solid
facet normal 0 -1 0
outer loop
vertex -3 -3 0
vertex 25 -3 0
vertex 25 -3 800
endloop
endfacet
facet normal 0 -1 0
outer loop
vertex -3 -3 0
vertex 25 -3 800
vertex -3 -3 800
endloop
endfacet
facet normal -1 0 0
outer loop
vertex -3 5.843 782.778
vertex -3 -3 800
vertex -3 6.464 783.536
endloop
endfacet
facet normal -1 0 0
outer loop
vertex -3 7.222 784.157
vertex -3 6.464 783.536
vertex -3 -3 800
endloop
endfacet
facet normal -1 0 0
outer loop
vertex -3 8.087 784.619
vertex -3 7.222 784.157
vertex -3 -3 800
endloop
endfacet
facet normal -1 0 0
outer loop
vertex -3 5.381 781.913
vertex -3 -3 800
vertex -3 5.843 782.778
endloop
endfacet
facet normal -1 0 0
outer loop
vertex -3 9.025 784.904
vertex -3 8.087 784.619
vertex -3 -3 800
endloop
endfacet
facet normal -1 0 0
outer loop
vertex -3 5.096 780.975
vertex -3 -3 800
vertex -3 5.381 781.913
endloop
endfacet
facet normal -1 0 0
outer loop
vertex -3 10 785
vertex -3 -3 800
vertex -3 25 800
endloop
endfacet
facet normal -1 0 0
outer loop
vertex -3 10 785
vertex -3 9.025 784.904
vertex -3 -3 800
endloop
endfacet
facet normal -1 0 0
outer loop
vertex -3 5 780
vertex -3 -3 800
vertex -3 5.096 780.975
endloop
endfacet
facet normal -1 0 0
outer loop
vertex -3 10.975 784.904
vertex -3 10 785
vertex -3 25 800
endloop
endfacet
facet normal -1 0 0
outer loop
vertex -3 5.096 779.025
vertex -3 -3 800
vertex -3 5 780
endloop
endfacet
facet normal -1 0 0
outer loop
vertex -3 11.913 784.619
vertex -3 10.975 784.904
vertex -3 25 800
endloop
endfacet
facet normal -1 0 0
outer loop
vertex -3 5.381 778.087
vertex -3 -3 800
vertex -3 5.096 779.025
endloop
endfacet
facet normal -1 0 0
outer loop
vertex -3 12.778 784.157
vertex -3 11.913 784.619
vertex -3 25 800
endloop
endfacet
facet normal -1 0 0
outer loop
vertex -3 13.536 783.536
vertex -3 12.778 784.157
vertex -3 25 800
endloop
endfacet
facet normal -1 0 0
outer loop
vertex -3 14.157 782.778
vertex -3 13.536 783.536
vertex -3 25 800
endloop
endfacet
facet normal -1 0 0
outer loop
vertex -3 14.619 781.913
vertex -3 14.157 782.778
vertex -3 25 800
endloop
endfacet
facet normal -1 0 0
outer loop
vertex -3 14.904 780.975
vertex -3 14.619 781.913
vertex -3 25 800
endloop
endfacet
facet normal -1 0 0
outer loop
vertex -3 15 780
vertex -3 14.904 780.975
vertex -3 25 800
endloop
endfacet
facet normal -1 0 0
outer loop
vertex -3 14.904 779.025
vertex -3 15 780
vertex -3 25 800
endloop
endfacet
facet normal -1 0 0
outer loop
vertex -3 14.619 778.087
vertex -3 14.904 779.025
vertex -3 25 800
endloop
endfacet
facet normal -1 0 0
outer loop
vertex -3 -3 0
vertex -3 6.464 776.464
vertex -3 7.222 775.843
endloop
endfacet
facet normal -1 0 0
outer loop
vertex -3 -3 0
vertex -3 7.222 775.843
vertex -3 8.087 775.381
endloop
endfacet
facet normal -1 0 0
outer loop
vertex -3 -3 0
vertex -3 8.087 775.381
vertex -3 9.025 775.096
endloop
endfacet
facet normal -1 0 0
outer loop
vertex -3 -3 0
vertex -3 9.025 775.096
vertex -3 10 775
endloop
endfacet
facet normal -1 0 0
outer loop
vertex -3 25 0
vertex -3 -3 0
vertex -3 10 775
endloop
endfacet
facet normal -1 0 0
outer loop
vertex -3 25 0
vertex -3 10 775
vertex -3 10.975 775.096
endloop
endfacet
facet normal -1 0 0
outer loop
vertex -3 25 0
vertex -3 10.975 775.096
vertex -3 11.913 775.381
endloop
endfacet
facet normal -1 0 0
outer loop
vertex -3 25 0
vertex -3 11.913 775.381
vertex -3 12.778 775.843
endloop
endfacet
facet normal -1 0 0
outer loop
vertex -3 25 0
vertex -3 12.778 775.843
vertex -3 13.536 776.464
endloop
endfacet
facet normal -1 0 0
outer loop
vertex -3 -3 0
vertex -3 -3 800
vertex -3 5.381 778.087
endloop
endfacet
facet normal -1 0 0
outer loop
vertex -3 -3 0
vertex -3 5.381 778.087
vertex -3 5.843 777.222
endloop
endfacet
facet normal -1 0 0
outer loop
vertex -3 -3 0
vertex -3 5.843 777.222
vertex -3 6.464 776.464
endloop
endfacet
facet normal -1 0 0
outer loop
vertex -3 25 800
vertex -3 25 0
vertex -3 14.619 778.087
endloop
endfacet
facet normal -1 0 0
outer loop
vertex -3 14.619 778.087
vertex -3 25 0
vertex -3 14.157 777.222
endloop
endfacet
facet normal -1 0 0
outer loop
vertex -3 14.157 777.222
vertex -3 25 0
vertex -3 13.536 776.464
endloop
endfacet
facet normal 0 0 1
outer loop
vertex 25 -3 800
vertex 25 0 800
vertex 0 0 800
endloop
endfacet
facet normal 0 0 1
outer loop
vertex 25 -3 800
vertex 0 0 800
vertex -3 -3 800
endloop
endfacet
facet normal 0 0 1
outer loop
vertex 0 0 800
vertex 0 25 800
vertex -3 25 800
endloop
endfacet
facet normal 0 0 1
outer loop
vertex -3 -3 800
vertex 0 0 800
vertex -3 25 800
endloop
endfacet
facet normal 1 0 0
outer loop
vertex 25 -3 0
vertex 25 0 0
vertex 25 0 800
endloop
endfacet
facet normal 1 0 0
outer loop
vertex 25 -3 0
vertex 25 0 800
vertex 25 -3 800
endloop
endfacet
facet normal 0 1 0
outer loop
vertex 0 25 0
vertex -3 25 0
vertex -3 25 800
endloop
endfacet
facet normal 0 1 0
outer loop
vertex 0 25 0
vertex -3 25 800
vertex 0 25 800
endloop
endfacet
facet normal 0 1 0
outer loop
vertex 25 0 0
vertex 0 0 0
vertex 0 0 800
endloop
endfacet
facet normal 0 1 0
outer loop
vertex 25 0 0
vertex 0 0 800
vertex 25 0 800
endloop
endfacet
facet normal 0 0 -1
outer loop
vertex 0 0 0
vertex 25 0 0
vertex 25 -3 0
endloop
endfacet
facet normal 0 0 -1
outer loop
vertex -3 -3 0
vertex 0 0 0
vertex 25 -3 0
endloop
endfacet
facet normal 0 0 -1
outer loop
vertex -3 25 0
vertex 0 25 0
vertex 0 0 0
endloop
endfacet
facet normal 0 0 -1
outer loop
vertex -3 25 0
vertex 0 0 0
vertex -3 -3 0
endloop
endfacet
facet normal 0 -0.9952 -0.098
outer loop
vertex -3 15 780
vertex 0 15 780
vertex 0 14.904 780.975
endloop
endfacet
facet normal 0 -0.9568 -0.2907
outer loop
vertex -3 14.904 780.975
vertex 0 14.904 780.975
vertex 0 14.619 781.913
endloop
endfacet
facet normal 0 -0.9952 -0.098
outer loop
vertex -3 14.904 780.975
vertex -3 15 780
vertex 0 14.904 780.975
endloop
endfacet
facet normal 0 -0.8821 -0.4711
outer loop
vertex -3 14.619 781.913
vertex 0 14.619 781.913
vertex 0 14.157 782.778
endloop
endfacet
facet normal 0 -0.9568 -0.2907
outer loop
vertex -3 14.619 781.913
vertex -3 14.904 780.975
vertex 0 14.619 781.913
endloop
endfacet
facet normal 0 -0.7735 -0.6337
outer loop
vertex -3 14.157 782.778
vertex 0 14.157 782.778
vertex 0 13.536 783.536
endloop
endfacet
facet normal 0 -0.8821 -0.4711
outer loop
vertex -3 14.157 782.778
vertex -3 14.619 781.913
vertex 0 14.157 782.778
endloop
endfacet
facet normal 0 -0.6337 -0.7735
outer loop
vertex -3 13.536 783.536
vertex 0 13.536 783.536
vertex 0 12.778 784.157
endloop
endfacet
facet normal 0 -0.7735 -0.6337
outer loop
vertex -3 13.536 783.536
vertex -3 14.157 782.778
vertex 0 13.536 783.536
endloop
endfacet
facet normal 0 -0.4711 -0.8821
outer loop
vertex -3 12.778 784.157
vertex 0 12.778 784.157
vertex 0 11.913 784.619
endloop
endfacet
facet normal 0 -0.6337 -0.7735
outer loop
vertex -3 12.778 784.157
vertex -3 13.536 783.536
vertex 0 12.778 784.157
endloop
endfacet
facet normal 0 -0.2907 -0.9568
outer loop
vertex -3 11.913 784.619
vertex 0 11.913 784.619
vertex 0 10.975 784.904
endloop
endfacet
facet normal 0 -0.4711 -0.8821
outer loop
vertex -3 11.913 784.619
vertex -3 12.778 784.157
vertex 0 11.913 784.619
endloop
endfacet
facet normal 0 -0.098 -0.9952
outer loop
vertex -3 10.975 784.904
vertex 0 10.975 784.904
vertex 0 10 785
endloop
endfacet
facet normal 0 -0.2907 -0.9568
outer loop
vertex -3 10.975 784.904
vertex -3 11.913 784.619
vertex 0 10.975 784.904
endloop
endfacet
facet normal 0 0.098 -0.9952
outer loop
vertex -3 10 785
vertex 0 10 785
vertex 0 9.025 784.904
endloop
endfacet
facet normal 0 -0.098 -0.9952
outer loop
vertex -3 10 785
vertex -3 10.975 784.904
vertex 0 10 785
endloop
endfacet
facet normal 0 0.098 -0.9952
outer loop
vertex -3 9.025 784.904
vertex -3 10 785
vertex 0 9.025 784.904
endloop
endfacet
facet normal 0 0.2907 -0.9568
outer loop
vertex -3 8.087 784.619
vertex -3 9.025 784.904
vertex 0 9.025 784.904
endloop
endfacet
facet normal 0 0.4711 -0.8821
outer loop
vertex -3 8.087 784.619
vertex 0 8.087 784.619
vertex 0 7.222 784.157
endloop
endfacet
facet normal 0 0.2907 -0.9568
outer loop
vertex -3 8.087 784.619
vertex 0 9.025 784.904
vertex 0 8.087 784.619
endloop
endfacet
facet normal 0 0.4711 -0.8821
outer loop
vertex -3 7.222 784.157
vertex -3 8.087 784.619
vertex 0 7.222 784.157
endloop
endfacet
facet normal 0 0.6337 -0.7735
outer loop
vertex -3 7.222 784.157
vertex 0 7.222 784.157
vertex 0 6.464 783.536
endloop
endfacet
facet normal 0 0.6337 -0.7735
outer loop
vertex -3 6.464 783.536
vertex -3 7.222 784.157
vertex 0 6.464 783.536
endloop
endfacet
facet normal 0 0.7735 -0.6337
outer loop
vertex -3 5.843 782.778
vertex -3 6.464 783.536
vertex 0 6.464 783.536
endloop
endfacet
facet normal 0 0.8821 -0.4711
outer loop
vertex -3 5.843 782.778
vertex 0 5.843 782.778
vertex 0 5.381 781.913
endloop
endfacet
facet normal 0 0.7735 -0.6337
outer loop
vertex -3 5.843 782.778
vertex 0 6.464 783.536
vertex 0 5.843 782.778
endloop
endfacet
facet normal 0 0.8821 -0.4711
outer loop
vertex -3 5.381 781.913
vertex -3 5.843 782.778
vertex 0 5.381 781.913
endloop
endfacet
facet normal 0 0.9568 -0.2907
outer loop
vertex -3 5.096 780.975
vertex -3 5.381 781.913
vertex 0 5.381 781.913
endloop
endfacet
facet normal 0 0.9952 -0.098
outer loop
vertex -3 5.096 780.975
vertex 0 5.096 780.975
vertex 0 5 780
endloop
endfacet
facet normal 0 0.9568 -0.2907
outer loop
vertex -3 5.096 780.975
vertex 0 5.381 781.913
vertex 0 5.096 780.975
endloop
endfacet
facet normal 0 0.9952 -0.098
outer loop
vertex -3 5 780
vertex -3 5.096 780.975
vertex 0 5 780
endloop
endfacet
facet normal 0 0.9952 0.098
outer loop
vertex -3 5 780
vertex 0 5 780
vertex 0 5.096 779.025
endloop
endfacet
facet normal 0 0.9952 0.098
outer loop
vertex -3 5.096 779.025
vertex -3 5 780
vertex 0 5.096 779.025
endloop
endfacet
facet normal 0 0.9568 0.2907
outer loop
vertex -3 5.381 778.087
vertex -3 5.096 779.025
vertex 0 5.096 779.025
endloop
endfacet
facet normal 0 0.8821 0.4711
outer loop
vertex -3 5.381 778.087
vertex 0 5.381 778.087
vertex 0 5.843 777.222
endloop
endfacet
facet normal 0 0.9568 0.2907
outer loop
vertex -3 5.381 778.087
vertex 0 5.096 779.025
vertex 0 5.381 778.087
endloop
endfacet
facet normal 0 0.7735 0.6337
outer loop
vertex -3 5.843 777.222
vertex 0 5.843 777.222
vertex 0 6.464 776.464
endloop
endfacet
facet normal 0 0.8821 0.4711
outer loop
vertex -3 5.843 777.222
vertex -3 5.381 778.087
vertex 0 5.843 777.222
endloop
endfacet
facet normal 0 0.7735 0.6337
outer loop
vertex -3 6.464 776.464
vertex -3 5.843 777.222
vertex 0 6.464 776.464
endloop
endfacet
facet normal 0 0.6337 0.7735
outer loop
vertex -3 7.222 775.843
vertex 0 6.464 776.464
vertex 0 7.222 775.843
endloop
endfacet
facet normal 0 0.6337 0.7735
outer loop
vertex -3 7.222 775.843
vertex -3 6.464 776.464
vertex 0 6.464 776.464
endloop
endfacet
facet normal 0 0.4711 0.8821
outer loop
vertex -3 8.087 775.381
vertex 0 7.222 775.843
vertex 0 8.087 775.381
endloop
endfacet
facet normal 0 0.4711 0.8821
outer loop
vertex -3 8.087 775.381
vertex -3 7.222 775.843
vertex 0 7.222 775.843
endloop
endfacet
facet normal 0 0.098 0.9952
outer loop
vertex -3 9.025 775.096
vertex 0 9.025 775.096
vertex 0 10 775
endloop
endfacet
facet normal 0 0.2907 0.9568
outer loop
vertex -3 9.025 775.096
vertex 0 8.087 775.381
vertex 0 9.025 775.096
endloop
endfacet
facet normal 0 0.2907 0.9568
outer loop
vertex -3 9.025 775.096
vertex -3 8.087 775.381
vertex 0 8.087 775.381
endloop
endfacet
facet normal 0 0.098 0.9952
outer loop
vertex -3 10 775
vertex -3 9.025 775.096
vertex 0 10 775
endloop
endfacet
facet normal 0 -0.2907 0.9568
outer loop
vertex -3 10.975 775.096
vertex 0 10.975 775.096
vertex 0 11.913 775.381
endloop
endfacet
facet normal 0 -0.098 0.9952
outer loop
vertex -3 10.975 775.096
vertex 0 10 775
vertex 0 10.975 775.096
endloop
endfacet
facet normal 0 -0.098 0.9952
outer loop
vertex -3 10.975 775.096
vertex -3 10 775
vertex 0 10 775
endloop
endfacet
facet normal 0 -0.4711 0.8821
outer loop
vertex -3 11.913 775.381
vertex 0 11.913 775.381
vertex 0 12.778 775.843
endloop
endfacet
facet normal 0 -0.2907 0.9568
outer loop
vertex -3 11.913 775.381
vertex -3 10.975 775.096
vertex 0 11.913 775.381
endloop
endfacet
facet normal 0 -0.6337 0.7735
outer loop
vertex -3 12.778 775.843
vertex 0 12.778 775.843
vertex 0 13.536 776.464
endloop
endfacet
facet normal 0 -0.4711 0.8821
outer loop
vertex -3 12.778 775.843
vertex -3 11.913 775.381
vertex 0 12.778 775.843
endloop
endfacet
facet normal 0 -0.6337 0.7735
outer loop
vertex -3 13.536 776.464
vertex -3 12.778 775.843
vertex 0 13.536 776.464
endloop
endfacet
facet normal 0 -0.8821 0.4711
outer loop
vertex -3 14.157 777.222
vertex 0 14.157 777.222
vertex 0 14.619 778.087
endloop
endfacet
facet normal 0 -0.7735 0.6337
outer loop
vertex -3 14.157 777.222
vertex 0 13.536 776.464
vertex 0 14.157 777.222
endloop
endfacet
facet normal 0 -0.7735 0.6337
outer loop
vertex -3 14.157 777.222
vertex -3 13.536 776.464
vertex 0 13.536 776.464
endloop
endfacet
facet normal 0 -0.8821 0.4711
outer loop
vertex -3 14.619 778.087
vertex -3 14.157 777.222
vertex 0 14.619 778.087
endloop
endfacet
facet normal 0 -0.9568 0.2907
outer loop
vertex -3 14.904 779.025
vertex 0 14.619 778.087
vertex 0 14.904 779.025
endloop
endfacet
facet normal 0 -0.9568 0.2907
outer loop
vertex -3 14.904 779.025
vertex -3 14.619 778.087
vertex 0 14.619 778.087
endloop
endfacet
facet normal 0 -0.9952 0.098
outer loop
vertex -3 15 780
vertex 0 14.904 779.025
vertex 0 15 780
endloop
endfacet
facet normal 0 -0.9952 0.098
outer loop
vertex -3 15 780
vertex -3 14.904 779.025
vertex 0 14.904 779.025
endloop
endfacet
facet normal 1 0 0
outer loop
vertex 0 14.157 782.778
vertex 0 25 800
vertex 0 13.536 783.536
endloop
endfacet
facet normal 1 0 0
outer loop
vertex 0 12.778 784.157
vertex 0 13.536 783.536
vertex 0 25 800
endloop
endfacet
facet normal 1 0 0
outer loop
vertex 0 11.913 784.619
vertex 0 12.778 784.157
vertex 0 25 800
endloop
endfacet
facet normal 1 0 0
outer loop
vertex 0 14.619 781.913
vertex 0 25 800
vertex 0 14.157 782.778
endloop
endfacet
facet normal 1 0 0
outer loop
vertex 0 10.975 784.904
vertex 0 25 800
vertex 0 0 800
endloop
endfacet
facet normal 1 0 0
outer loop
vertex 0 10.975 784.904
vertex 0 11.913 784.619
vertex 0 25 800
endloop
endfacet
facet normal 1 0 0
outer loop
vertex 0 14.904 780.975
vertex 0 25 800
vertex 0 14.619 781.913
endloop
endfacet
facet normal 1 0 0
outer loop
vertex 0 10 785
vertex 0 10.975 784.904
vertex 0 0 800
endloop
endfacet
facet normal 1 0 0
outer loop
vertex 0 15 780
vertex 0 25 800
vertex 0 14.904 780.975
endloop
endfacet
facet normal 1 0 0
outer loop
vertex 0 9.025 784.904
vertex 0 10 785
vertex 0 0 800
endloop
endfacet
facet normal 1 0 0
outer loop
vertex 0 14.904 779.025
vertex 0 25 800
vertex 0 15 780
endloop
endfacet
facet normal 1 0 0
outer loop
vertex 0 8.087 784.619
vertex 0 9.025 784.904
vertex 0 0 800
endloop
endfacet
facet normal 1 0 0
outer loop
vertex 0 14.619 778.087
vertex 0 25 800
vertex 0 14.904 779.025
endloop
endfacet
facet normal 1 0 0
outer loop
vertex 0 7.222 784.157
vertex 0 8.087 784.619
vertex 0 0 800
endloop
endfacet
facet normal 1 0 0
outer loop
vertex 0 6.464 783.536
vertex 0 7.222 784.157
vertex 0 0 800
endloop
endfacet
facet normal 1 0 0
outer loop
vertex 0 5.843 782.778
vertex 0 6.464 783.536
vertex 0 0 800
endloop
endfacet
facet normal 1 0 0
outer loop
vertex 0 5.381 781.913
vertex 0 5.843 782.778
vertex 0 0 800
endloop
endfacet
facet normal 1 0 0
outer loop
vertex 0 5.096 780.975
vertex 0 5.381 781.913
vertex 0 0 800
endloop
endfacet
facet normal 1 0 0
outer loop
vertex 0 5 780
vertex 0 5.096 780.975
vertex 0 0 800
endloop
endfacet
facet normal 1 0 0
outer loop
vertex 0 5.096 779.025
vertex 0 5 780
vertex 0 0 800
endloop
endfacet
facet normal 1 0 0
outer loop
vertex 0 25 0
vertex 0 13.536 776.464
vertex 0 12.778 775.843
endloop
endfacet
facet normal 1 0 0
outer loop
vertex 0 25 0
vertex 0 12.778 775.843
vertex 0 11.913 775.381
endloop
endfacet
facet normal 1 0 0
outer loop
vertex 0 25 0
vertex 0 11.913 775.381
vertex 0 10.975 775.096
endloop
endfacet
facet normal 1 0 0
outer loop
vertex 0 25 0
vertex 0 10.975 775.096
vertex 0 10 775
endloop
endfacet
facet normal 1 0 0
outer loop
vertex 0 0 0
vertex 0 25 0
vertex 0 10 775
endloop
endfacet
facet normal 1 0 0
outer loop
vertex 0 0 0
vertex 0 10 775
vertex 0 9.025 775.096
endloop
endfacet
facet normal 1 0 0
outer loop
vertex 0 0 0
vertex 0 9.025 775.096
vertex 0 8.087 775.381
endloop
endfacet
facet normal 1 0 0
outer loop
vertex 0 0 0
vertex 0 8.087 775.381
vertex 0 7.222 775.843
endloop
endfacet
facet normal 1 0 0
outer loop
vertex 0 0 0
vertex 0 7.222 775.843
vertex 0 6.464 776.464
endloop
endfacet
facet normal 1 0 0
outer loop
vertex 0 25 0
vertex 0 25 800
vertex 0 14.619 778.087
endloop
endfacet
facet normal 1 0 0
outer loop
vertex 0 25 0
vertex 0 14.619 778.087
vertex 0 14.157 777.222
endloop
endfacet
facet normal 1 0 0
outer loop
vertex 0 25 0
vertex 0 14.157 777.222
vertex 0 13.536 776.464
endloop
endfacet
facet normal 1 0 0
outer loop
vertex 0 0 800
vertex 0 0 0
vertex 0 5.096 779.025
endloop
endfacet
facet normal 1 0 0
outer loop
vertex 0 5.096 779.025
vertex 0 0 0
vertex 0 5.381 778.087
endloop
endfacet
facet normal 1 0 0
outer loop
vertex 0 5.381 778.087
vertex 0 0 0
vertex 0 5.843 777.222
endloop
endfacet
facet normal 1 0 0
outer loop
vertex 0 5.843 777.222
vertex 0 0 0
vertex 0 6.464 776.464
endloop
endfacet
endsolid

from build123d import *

# Parameters (mm, degrees)
EXTRUDE_1_DEPTH     = 800
SKETCH_2_R          = 5
CUT_EXTRUDE_3_DEPTH = 10


with BuildPart() as part:
    # Эскиз1 → Вытянуть-Тонкостенный1 (new body)
    with BuildSketch(Plane.XY):
        Polygon((0, 25), (0, 0), (25, 0), (25, -3), (-3, -3), (-3, 25), align=None)
    extrude(amount=EXTRUDE_1_DEPTH)

    # Эскиз2 → Вырез-Вытянуть3 (cut)
    with BuildSketch(Plane.YZ.offset(-3)):
        with Locations((10, 780)):
            Circle(SKETCH_2_R)
    extrude(amount=CUT_EXTRUDE_3_DEPTH, mode=Mode.SUBTRACT)


solid = part.part
